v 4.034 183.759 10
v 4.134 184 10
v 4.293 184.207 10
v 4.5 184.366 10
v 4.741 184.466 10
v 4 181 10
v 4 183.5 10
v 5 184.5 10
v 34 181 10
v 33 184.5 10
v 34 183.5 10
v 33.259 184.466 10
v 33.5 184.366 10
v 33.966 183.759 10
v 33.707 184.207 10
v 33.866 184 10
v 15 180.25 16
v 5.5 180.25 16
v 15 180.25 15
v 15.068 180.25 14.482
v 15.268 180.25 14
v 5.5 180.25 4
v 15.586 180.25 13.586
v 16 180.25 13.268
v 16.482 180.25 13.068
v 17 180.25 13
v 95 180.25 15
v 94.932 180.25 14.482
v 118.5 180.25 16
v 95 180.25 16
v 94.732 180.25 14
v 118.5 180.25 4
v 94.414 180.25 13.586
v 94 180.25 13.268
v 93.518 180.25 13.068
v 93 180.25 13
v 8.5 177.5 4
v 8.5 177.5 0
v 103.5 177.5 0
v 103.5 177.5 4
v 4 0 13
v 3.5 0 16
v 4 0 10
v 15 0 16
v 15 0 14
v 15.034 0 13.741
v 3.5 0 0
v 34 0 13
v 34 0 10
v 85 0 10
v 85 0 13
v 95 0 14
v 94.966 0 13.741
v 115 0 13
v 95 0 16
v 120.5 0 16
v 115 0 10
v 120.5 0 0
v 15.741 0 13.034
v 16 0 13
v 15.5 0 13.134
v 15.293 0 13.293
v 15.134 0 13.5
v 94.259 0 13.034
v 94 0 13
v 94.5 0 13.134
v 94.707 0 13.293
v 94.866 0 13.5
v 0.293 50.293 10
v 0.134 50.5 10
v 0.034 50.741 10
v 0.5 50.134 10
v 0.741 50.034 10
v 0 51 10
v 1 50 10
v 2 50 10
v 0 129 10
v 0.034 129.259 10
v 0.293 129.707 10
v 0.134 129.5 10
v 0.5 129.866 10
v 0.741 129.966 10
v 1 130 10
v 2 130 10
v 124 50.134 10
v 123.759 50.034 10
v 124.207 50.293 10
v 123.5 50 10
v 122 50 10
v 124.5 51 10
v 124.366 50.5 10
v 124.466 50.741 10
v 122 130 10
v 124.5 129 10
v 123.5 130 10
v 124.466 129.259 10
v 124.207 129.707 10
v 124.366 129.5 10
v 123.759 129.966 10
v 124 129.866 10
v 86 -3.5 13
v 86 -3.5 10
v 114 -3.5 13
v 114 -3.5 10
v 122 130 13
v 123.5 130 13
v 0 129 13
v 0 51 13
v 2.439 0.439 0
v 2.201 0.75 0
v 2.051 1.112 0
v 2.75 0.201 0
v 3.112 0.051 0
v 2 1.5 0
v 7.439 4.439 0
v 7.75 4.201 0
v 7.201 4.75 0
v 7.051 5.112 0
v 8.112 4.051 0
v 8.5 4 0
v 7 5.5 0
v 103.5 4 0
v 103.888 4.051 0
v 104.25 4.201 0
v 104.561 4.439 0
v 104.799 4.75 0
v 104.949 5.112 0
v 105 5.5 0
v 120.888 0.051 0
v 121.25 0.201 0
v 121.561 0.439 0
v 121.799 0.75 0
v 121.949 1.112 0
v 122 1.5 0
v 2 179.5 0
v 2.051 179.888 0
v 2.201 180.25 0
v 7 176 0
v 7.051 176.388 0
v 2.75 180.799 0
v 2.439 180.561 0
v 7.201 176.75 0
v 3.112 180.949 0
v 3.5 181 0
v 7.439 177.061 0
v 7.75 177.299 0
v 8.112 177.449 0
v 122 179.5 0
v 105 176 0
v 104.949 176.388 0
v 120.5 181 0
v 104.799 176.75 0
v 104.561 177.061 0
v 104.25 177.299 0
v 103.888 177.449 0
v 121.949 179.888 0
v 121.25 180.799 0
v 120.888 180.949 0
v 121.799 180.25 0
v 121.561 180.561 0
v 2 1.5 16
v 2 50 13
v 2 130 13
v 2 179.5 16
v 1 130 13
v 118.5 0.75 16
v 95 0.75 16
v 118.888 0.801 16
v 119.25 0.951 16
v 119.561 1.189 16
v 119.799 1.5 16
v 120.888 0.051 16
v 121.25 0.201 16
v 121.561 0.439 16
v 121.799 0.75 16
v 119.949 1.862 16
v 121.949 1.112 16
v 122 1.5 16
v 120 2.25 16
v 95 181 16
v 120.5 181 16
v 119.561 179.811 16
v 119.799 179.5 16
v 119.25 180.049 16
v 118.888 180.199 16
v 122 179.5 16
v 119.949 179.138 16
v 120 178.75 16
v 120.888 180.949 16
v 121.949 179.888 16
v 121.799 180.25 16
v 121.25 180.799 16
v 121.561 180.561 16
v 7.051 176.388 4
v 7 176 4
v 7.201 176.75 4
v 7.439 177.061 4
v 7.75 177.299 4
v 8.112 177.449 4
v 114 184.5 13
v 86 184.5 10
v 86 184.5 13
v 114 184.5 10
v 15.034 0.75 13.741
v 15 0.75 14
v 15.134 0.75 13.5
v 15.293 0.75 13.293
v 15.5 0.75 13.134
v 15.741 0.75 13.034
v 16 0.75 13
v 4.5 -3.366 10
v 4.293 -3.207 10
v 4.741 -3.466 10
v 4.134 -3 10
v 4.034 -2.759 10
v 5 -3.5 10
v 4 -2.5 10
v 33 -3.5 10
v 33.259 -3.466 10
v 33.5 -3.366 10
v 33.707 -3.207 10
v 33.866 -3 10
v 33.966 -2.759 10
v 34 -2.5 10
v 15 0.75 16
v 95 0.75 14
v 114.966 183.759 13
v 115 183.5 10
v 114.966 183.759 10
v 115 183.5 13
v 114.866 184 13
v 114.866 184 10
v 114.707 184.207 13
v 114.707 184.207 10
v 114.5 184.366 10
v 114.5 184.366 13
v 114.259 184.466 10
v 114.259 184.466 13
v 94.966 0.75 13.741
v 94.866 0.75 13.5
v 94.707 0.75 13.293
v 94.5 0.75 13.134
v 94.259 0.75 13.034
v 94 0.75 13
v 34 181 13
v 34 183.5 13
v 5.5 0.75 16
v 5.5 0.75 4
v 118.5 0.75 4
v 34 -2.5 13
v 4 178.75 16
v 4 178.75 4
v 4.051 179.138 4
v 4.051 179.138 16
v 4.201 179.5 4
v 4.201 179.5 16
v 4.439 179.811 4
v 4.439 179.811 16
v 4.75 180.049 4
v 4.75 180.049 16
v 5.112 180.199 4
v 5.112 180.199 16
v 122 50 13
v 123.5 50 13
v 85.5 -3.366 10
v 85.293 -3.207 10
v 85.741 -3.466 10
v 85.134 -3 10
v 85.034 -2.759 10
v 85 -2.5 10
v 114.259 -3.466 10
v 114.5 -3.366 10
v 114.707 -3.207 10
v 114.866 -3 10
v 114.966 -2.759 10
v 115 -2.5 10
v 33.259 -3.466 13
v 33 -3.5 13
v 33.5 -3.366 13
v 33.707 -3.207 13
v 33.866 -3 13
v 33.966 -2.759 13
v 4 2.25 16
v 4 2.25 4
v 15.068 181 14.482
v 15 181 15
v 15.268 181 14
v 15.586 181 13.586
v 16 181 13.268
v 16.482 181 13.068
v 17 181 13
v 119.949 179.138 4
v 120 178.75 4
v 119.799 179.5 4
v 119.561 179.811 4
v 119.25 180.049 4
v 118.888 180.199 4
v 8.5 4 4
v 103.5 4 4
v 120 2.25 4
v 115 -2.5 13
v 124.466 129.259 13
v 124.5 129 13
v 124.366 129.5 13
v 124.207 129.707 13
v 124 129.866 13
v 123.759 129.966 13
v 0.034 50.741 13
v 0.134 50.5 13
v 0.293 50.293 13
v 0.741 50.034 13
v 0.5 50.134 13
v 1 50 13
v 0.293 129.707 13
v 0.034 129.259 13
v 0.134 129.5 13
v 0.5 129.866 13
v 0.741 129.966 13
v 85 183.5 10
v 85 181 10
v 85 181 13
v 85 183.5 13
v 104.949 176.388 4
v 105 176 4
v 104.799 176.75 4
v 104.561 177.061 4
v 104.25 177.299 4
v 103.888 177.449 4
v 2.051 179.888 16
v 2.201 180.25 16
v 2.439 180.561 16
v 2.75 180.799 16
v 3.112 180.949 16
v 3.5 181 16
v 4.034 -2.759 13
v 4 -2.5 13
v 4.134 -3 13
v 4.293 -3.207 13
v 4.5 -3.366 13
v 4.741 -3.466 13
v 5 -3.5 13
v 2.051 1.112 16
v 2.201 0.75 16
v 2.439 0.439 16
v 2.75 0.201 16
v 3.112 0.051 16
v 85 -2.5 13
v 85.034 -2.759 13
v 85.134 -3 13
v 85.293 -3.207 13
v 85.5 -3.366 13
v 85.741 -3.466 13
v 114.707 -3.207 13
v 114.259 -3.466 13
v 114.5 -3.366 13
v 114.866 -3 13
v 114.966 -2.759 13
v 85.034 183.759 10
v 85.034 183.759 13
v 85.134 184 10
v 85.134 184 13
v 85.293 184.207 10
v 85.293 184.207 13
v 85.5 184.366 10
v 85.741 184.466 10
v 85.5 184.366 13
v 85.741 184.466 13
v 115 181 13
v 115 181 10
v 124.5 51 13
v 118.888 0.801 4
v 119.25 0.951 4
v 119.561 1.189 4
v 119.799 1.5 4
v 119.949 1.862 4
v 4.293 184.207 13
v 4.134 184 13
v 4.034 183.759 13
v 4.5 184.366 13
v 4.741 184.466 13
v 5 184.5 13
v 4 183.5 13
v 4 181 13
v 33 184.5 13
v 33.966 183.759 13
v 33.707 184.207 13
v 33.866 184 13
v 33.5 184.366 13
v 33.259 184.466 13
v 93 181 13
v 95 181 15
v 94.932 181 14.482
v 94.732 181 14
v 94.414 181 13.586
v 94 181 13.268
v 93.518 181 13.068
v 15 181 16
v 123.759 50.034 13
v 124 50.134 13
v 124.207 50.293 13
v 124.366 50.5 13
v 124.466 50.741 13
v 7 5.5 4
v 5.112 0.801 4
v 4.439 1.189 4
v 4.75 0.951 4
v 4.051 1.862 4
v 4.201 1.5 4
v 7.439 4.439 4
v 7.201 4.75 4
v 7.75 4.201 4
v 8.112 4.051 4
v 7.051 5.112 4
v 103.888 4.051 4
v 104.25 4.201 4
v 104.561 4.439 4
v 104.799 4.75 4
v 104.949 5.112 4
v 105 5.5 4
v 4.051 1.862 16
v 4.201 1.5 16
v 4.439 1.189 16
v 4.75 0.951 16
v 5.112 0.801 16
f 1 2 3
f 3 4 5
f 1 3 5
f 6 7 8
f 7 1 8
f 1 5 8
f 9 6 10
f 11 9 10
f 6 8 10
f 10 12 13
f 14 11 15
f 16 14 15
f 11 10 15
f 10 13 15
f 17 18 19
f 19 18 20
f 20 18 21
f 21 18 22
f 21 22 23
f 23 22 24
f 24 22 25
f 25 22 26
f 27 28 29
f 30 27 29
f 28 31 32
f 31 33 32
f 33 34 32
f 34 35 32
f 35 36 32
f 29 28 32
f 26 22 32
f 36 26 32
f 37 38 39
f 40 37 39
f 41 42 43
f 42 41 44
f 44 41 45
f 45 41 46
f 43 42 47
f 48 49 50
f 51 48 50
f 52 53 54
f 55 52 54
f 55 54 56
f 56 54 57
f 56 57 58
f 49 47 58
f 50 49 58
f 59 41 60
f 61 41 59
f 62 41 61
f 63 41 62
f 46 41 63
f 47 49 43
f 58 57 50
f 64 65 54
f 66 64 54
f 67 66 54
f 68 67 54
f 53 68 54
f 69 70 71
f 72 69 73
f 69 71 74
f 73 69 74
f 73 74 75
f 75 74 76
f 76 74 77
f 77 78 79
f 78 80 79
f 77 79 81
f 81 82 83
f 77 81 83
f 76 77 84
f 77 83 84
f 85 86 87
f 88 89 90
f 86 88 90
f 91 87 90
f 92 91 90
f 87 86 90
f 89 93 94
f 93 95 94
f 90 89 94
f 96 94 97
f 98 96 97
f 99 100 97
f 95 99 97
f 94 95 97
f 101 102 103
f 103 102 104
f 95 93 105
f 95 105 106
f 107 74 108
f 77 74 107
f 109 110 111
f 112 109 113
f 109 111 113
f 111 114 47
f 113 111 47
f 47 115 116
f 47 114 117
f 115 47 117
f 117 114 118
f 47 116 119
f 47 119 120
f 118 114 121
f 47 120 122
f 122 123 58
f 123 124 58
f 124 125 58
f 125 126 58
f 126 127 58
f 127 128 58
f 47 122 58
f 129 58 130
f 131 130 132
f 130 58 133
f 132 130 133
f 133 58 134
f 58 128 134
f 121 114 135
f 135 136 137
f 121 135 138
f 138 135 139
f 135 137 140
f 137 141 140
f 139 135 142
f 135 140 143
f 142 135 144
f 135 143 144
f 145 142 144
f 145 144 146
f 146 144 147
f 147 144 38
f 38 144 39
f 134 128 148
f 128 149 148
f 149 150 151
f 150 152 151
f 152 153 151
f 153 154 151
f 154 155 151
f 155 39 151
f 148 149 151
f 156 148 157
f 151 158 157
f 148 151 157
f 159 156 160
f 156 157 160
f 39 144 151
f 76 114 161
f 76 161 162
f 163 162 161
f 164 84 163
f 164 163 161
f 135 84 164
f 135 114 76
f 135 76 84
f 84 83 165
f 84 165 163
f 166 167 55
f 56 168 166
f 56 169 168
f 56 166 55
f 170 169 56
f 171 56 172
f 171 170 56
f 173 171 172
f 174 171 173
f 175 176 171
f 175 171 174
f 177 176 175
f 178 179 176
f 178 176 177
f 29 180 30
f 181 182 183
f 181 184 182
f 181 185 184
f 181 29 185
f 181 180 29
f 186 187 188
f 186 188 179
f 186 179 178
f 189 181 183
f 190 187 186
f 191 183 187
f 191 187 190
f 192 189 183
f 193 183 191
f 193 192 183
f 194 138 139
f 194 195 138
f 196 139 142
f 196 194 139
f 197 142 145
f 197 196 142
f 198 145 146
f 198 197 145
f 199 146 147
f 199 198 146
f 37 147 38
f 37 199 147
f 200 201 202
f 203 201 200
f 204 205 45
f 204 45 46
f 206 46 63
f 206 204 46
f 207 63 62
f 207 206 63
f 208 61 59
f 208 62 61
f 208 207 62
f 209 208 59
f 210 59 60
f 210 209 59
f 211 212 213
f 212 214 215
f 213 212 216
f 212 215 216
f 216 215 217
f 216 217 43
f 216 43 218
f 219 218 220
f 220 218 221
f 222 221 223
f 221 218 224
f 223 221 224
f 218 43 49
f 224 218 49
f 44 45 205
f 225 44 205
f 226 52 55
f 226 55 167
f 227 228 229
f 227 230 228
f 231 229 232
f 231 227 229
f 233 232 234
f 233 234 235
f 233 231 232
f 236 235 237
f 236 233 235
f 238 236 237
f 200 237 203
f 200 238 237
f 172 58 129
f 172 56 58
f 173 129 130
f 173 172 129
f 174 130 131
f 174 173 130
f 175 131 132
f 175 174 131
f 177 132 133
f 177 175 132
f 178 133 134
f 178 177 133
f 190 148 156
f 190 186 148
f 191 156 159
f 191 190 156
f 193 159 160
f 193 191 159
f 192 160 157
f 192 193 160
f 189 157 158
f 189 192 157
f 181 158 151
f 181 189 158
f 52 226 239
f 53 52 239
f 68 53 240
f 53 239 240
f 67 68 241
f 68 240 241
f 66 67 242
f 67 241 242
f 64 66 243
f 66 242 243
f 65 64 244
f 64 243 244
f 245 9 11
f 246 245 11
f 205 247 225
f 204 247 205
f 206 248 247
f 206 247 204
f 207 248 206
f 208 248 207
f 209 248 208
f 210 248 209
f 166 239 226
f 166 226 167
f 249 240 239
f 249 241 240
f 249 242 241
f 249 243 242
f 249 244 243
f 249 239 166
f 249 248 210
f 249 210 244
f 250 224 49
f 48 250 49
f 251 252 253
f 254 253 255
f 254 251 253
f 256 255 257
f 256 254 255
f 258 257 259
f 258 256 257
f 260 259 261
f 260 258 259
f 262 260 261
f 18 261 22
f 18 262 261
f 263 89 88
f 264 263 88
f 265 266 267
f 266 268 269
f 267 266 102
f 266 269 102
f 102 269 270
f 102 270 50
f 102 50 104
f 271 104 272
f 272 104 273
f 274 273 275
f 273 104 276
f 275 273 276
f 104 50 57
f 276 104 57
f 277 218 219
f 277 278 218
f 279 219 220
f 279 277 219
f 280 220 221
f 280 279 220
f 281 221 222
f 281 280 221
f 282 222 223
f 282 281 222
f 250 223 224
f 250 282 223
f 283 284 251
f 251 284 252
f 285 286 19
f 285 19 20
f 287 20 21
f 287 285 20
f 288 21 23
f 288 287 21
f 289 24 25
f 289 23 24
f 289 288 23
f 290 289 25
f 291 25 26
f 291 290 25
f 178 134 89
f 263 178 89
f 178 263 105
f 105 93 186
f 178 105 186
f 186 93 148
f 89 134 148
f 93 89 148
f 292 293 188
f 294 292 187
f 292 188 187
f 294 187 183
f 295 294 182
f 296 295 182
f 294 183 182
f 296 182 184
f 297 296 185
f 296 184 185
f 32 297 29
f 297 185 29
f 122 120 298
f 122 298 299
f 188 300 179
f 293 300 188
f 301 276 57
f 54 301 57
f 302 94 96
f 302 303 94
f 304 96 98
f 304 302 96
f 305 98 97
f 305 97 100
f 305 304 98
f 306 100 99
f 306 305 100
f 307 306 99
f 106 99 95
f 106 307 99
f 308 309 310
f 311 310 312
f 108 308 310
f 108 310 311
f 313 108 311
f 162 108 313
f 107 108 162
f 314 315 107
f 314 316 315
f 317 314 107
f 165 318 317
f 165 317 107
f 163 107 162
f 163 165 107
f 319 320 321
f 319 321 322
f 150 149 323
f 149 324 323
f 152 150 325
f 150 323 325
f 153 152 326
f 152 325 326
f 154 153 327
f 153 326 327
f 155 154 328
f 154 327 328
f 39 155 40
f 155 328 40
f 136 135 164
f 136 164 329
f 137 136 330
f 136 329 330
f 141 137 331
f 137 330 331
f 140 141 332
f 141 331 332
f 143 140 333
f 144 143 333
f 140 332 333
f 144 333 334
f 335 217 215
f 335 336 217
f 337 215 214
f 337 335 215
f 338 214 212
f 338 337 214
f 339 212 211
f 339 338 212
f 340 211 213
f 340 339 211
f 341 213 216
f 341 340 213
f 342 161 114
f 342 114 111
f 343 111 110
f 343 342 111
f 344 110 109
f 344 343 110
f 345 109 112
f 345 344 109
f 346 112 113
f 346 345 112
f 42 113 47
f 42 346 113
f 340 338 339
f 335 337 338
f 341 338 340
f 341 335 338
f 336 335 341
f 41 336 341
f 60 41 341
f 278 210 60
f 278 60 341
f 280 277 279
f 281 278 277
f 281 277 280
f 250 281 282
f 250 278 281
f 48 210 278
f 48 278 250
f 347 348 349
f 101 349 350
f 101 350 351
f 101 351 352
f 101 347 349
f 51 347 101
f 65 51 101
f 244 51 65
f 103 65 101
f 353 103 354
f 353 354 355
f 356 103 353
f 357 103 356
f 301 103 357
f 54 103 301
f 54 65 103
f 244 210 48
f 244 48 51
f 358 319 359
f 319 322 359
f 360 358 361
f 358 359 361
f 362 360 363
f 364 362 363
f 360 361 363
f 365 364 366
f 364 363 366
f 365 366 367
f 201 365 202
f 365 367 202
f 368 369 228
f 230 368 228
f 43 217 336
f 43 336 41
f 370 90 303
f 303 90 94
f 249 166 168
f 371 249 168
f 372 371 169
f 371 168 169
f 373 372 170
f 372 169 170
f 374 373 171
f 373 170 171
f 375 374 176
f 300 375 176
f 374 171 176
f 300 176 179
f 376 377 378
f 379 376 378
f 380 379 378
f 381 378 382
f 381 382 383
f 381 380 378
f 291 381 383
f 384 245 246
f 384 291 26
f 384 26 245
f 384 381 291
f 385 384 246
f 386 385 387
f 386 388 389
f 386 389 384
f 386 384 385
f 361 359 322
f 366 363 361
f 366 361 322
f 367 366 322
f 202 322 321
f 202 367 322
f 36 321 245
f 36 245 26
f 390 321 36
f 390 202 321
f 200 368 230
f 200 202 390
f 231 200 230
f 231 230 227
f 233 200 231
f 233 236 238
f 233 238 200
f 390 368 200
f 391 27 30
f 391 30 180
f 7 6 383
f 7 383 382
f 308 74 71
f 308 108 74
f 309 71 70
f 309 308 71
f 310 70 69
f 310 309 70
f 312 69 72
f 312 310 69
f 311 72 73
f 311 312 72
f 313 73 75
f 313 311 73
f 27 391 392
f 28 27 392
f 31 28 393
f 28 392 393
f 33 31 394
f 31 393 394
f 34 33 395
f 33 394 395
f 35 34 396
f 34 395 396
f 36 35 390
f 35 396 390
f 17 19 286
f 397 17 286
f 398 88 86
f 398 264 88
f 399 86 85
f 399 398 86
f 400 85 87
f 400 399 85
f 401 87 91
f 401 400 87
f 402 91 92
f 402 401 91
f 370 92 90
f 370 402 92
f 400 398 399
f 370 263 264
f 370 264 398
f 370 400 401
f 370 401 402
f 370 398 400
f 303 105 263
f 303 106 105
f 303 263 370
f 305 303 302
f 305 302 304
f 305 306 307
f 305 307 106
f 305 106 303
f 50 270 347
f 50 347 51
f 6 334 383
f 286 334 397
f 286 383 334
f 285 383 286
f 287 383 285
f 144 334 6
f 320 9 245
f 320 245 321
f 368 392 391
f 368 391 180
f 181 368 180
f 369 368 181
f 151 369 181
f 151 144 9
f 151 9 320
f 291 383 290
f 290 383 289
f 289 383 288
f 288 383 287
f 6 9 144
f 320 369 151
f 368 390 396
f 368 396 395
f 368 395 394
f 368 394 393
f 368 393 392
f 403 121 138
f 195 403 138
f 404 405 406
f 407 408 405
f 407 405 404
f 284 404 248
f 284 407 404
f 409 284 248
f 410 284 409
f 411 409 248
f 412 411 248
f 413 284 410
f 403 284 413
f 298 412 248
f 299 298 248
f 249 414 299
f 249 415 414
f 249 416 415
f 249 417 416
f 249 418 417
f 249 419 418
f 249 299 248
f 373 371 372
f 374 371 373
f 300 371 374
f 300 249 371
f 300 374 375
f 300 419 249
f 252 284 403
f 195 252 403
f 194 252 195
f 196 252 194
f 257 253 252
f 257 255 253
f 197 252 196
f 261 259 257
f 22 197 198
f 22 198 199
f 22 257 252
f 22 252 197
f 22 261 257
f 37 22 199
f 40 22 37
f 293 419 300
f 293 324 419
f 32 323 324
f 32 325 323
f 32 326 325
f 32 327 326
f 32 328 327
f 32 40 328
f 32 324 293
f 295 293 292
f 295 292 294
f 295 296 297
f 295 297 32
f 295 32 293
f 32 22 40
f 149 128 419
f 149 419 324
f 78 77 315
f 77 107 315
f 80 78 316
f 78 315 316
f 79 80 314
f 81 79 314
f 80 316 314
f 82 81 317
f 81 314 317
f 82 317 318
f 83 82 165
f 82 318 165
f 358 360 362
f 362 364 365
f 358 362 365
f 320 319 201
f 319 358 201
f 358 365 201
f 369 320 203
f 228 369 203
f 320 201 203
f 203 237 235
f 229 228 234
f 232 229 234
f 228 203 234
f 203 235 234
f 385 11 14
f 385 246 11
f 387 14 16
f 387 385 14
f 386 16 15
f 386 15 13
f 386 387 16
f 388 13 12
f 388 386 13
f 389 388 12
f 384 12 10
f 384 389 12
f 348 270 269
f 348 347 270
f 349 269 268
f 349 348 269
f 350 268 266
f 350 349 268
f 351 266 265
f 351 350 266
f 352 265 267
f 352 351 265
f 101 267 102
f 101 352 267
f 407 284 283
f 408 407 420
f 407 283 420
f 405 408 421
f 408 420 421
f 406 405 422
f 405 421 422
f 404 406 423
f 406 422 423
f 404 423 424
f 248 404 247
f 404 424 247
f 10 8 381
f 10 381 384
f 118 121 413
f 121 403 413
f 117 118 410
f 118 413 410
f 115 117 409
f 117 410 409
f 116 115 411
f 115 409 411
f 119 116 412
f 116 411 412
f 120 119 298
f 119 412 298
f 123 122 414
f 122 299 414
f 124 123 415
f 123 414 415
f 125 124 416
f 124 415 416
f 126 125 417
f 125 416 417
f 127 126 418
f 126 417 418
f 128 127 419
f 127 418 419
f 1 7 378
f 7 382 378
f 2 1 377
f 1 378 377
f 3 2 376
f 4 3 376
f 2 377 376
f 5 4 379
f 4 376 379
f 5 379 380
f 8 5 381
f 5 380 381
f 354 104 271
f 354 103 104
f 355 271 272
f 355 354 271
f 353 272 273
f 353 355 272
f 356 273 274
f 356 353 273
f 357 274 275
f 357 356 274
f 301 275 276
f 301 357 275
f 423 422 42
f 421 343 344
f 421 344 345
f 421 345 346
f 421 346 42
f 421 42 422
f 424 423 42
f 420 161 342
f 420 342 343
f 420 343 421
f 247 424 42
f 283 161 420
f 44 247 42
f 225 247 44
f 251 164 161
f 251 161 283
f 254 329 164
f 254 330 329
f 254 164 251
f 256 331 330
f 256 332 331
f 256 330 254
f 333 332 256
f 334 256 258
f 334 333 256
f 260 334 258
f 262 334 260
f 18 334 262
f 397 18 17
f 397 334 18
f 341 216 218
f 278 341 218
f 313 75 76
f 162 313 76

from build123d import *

# Parameters (mm, degrees)
BOX011_W      = 4
BOX011_H      = 80
BOX011_DEPTH  = 3
FILLET006_R   = 1
BOX010_W      = 30
BOX010_H      = 4
BOX010_DEPTH  = 3
FILLET007_R   = 1
BOX009_W      = 30
BOX009_H      = 4
BOX009_DEPTH  = 3
FILLET008_R   = 1
BOX008_W      = 30
BOX008_H      = 4
BOX008_DEPTH  = 3
FILLET009_R   = 1
BOX013_W      = 4
BOX013_H      = 80
BOX013_DEPTH  = 3
FILLET010_R   = 1
BOX012_W      = 30
BOX012_H      = 4
BOX012_DEPTH  = 3
FILLET005_R   = 1
BOX006_W      = 80
BOX006_H      = 10
BOX006_DEPTH  = 10
BOX007_W      = 80
BOX007_H      = 10
BOX007_DEPTH  = 10
FILLET004_1_R = 2
FILLET004_2_R = 1
BOX003_W      = 116
BOX003_H      = 179.5
BOX003_DEPTH  = 20
FILLET002_R   = 1.5
BOX002_W      = 120
BOX002_H      = 181
BOX002_DEPTH  = 12
FILLET003_R   = 1.5
BOX001_W      = 98
BOX001_H      = 173.5
BOX001_DEPTH  = 4
FILLET_R      = 1.5
BOX_W         = 120
BOX_H         = 181
BOX_DEPTH     = 4
FILLET001_R   = 1.5


with BuildPart() as fillet006:
    # Box011 → Box011 (new body)
    with BuildSketch(Plane(origin=(0, 50, 5), x_dir=(1, 0, 0), z_dir=(0, 0, 1))):
        with Locations((2, 40)):
            Rectangle(BOX011_W, BOX011_H)
    extrude(amount=BOX011_DEPTH)

    # Fillet006
    fillet006_edges = [fillet006.edges().sort_by_distance(p)[0] for p in [
        (0, 50, 6.5),
        (0, 130, 6.5),
    ]]
    fillet(fillet006_edges, radius=FILLET006_R)


with BuildPart() as fillet007:
    # Box010 → Box010 (new body)
    with BuildSketch(Plane(origin=(85, -3.5, 5), x_dir=(1, 0, 0), z_dir=(0, 0, 1))):
        with Locations((15, 2)):
            Rectangle(BOX010_W, BOX010_H)
    extrude(amount=BOX010_DEPTH)

    # Fillet007
    fillet007_edges = [fillet007.edges().sort_by_distance(p)[0] for p in [
        (85, -3.5, 6.5),
        (115, -3.5, 6.5),
    ]]
    fillet(fillet007_edges, radius=FILLET007_R)


with BuildPart() as fillet008:
    # Box009 → Box009 (new body)
    with BuildSketch(Plane(origin=(4, 180.5, 5), x_dir=(1, 0, 0), z_dir=(0, 0, 1))):
        with Locations((15, 2)):
            Rectangle(BOX009_W, BOX009_H)
    extrude(amount=BOX009_DEPTH)

    # Fillet008
    fillet008_edges = [fillet008.edges().sort_by_distance(p)[0] for p in [
        (4, 184.5, 6.5),
        (34, 184.5, 6.5),
    ]]
    fillet(fillet008_edges, radius=FILLET008_R)


with BuildPart() as fillet009:
    # Box008 → Box008 (new body)
    with BuildSketch(Plane(origin=(85, 180.5, 5), x_dir=(1, 0, 0), z_dir=(0, 0, 1))):
        with Locations((15, 2)):
            Rectangle(BOX008_W, BOX008_H)
    extrude(amount=BOX008_DEPTH)

    # Fillet009
    fillet009_edges = [fillet009.edges().sort_by_distance(p)[0] for p in [
        (85, 184.5, 6.5),
        (115, 184.5, 6.5),
    ]]
    fillet(fillet009_edges, radius=FILLET009_R)


with BuildPart() as fillet010:
    # Box013 → Box013 (new body)
    with BuildSketch(Plane(origin=(120.5, 50, 5), x_dir=(1, 0, 0), z_dir=(0, 0, 1))):
        with Locations((2, 40)):
            Rectangle(BOX013_W, BOX013_H)
    extrude(amount=BOX013_DEPTH)

    # Fillet010
    fillet010_edges = [fillet010.edges().sort_by_distance(p)[0] for p in [
        (124.5, 50, 6.5),
        (124.5, 130, 6.5),
    ]]
    fillet(fillet010_edges, radius=FILLET010_R)


with BuildPart() as fusion002:
    # Box012 → Box012 (new body)
    with BuildSketch(Plane(origin=(4, -3.5, 5), x_dir=(1, 0, 0), z_dir=(0, 0, 1))):
        with Locations((15, 2)):
            Rectangle(BOX012_W, BOX012_H)
    extrude(amount=BOX012_DEPTH)

    # Fillet005
    fillet005_edges = [fusion002.edges().sort_by_distance(p)[0] for p in [
        (4, -3.5, 6.5),
        (34, -3.5, 6.5),
    ]]
    fillet(fillet005_edges, radius=FILLET005_R)

    # Fusion002: union Fillet006, Fillet007, Fillet008, Fillet009, Fillet010
    add(fillet006.part)
    add(fillet007.part)
    add(fillet008.part)
    add(fillet009.part)
    add(fillet010.part)


with BuildPart() as fusion002_1:
    # Fusion002 placement: moved
    add(fusion002.part.moved(Location((0, 0, 5))))


with BuildPart() as cube006:
    # Box006 → Box006 (new body)
    with BuildSketch(Plane(origin=(15, -5, 0), x_dir=(1, 0, 0), z_dir=(0, 0, 1))):
        with Locations((40, 5)):
            Rectangle(BOX006_W, BOX006_H)
    extrude(amount=BOX006_DEPTH)


with BuildPart() as fillet004:
    # Box007 → Box007 (new body)
    with BuildSketch(Plane(origin=(15, 175, 0), x_dir=(1, 0, 0), z_dir=(0, 0, 1))):
        with Locations((40, 5)):
            Rectangle(BOX007_W, BOX007_H)
    extrude(amount=BOX007_DEPTH)

    # Fusion: union Cube006
    add(cube006.part)


with BuildPart() as fillet004_1:
    # Fusion placement: moved
    add(fillet004.part.moved(Location((0, 0, 13))))

    # Fillet004 1
    fillet004_1_edges = [fillet004_1.edges().sort_by_distance(p)[0] for p in [
        (15, 180, 13),
        (95, 180, 13),
    ]]
    fillet(fillet004_1_edges, radius=FILLET004_1_R)

    # Fillet004 2
    fillet004_2_edges = [fillet004_1.edges().sort_by_distance(p)[0] for p in [
        (15, 0, 13),
        (95, 0, 13),
    ]]
    fillet(fillet004_2_edges, radius=FILLET004_2_R)


with BuildPart() as fillet002:
    # Box003 → Box003 (new body)
    with BuildSketch(Plane(origin=(4, 0.75, 4), x_dir=(1, 0, 0), z_dir=(0, 0, 1))):
        with Locations((58, 89.75)):
            Rectangle(BOX003_W, BOX003_H)
    extrude(amount=BOX003_DEPTH)

    # Fillet002
    fillet002_edges = [fillet002.edges().sort_by_distance(p)[0] for p in [
        (4, 0.75, 14),
        (4, 180.25, 14),
        (120, 0.75, 14),
        (120, 180.25, 14),
    ]]
    fillet(fillet002_edges, radius=FILLET002_R)


with BuildPart() as cut002:
    # Box002 → Box002 (new body)
    with BuildSketch(Plane(origin=(2, 0, 4), x_dir=(1, 0, 0), z_dir=(0, 0, 1))):
        with Locations((60, 90.5)):
            Rectangle(BOX002_W, BOX002_H)
    extrude(amount=BOX002_DEPTH)

    # Fillet003
    fillet003_edges = [cut002.edges().sort_by_distance(p)[0] for p in [
        (2, 0, 10),
        (2, 181, 10),
        (122, 0, 10),
        (122, 181, 10),
    ]]
    fillet(fillet003_edges, radius=FILLET003_R)

    # Cut001: cut Fillet002
    add(fillet002.part, mode=Mode.SUBTRACT)

    # Cut002: cut Fillet004
    add(fillet004_1.part, mode=Mode.SUBTRACT)


with BuildPart() as fillet_body:
    # Box001 → Box001 (new body)
    with BuildSketch(Plane(origin=(7, 4, 0), x_dir=(1, 0, 0), z_dir=(0, 0, 1))):
        with Locations((49, 86.75)):
            Rectangle(BOX001_W, BOX001_H)
    extrude(amount=BOX001_DEPTH)

    # Fillet
    fillet_edges = [fillet_body.edges().sort_by_distance(p)[0] for p in [
        (7, 4, 2),
        (7, 177.5, 2),
        (105, 4, 2),
        (105, 177.5, 2),
    ]]
    fillet(fillet_edges, radius=FILLET_R)


with BuildPart() as fusion003:
    # Box → Box (new body)
    with BuildSketch(Plane(origin=(2, 0, 0), x_dir=(1, 0, 0), z_dir=(0, 0, 1))):
        with Locations((60, 90.5)):
            Rectangle(BOX_W, BOX_H)
    extrude(amount=BOX_DEPTH)

    # Fillet001
    fillet001_edges = [fusion003.edges().sort_by_distance(p)[0] for p in [
        (2, 0, 2),
        (2, 181, 2),
        (122, 0, 2),
        (122, 181, 2),
    ]]
    fillet(fillet001_edges, radius=FILLET001_R)

    # Cut: cut Fillet body
    add(fillet_body.part, mode=Mode.SUBTRACT)

    # Fusion001: union Cut002
    add(cut002.part)

    # Fusion003: union Fusion002
    add(fusion002_1.part)


solid = fusion003.part
